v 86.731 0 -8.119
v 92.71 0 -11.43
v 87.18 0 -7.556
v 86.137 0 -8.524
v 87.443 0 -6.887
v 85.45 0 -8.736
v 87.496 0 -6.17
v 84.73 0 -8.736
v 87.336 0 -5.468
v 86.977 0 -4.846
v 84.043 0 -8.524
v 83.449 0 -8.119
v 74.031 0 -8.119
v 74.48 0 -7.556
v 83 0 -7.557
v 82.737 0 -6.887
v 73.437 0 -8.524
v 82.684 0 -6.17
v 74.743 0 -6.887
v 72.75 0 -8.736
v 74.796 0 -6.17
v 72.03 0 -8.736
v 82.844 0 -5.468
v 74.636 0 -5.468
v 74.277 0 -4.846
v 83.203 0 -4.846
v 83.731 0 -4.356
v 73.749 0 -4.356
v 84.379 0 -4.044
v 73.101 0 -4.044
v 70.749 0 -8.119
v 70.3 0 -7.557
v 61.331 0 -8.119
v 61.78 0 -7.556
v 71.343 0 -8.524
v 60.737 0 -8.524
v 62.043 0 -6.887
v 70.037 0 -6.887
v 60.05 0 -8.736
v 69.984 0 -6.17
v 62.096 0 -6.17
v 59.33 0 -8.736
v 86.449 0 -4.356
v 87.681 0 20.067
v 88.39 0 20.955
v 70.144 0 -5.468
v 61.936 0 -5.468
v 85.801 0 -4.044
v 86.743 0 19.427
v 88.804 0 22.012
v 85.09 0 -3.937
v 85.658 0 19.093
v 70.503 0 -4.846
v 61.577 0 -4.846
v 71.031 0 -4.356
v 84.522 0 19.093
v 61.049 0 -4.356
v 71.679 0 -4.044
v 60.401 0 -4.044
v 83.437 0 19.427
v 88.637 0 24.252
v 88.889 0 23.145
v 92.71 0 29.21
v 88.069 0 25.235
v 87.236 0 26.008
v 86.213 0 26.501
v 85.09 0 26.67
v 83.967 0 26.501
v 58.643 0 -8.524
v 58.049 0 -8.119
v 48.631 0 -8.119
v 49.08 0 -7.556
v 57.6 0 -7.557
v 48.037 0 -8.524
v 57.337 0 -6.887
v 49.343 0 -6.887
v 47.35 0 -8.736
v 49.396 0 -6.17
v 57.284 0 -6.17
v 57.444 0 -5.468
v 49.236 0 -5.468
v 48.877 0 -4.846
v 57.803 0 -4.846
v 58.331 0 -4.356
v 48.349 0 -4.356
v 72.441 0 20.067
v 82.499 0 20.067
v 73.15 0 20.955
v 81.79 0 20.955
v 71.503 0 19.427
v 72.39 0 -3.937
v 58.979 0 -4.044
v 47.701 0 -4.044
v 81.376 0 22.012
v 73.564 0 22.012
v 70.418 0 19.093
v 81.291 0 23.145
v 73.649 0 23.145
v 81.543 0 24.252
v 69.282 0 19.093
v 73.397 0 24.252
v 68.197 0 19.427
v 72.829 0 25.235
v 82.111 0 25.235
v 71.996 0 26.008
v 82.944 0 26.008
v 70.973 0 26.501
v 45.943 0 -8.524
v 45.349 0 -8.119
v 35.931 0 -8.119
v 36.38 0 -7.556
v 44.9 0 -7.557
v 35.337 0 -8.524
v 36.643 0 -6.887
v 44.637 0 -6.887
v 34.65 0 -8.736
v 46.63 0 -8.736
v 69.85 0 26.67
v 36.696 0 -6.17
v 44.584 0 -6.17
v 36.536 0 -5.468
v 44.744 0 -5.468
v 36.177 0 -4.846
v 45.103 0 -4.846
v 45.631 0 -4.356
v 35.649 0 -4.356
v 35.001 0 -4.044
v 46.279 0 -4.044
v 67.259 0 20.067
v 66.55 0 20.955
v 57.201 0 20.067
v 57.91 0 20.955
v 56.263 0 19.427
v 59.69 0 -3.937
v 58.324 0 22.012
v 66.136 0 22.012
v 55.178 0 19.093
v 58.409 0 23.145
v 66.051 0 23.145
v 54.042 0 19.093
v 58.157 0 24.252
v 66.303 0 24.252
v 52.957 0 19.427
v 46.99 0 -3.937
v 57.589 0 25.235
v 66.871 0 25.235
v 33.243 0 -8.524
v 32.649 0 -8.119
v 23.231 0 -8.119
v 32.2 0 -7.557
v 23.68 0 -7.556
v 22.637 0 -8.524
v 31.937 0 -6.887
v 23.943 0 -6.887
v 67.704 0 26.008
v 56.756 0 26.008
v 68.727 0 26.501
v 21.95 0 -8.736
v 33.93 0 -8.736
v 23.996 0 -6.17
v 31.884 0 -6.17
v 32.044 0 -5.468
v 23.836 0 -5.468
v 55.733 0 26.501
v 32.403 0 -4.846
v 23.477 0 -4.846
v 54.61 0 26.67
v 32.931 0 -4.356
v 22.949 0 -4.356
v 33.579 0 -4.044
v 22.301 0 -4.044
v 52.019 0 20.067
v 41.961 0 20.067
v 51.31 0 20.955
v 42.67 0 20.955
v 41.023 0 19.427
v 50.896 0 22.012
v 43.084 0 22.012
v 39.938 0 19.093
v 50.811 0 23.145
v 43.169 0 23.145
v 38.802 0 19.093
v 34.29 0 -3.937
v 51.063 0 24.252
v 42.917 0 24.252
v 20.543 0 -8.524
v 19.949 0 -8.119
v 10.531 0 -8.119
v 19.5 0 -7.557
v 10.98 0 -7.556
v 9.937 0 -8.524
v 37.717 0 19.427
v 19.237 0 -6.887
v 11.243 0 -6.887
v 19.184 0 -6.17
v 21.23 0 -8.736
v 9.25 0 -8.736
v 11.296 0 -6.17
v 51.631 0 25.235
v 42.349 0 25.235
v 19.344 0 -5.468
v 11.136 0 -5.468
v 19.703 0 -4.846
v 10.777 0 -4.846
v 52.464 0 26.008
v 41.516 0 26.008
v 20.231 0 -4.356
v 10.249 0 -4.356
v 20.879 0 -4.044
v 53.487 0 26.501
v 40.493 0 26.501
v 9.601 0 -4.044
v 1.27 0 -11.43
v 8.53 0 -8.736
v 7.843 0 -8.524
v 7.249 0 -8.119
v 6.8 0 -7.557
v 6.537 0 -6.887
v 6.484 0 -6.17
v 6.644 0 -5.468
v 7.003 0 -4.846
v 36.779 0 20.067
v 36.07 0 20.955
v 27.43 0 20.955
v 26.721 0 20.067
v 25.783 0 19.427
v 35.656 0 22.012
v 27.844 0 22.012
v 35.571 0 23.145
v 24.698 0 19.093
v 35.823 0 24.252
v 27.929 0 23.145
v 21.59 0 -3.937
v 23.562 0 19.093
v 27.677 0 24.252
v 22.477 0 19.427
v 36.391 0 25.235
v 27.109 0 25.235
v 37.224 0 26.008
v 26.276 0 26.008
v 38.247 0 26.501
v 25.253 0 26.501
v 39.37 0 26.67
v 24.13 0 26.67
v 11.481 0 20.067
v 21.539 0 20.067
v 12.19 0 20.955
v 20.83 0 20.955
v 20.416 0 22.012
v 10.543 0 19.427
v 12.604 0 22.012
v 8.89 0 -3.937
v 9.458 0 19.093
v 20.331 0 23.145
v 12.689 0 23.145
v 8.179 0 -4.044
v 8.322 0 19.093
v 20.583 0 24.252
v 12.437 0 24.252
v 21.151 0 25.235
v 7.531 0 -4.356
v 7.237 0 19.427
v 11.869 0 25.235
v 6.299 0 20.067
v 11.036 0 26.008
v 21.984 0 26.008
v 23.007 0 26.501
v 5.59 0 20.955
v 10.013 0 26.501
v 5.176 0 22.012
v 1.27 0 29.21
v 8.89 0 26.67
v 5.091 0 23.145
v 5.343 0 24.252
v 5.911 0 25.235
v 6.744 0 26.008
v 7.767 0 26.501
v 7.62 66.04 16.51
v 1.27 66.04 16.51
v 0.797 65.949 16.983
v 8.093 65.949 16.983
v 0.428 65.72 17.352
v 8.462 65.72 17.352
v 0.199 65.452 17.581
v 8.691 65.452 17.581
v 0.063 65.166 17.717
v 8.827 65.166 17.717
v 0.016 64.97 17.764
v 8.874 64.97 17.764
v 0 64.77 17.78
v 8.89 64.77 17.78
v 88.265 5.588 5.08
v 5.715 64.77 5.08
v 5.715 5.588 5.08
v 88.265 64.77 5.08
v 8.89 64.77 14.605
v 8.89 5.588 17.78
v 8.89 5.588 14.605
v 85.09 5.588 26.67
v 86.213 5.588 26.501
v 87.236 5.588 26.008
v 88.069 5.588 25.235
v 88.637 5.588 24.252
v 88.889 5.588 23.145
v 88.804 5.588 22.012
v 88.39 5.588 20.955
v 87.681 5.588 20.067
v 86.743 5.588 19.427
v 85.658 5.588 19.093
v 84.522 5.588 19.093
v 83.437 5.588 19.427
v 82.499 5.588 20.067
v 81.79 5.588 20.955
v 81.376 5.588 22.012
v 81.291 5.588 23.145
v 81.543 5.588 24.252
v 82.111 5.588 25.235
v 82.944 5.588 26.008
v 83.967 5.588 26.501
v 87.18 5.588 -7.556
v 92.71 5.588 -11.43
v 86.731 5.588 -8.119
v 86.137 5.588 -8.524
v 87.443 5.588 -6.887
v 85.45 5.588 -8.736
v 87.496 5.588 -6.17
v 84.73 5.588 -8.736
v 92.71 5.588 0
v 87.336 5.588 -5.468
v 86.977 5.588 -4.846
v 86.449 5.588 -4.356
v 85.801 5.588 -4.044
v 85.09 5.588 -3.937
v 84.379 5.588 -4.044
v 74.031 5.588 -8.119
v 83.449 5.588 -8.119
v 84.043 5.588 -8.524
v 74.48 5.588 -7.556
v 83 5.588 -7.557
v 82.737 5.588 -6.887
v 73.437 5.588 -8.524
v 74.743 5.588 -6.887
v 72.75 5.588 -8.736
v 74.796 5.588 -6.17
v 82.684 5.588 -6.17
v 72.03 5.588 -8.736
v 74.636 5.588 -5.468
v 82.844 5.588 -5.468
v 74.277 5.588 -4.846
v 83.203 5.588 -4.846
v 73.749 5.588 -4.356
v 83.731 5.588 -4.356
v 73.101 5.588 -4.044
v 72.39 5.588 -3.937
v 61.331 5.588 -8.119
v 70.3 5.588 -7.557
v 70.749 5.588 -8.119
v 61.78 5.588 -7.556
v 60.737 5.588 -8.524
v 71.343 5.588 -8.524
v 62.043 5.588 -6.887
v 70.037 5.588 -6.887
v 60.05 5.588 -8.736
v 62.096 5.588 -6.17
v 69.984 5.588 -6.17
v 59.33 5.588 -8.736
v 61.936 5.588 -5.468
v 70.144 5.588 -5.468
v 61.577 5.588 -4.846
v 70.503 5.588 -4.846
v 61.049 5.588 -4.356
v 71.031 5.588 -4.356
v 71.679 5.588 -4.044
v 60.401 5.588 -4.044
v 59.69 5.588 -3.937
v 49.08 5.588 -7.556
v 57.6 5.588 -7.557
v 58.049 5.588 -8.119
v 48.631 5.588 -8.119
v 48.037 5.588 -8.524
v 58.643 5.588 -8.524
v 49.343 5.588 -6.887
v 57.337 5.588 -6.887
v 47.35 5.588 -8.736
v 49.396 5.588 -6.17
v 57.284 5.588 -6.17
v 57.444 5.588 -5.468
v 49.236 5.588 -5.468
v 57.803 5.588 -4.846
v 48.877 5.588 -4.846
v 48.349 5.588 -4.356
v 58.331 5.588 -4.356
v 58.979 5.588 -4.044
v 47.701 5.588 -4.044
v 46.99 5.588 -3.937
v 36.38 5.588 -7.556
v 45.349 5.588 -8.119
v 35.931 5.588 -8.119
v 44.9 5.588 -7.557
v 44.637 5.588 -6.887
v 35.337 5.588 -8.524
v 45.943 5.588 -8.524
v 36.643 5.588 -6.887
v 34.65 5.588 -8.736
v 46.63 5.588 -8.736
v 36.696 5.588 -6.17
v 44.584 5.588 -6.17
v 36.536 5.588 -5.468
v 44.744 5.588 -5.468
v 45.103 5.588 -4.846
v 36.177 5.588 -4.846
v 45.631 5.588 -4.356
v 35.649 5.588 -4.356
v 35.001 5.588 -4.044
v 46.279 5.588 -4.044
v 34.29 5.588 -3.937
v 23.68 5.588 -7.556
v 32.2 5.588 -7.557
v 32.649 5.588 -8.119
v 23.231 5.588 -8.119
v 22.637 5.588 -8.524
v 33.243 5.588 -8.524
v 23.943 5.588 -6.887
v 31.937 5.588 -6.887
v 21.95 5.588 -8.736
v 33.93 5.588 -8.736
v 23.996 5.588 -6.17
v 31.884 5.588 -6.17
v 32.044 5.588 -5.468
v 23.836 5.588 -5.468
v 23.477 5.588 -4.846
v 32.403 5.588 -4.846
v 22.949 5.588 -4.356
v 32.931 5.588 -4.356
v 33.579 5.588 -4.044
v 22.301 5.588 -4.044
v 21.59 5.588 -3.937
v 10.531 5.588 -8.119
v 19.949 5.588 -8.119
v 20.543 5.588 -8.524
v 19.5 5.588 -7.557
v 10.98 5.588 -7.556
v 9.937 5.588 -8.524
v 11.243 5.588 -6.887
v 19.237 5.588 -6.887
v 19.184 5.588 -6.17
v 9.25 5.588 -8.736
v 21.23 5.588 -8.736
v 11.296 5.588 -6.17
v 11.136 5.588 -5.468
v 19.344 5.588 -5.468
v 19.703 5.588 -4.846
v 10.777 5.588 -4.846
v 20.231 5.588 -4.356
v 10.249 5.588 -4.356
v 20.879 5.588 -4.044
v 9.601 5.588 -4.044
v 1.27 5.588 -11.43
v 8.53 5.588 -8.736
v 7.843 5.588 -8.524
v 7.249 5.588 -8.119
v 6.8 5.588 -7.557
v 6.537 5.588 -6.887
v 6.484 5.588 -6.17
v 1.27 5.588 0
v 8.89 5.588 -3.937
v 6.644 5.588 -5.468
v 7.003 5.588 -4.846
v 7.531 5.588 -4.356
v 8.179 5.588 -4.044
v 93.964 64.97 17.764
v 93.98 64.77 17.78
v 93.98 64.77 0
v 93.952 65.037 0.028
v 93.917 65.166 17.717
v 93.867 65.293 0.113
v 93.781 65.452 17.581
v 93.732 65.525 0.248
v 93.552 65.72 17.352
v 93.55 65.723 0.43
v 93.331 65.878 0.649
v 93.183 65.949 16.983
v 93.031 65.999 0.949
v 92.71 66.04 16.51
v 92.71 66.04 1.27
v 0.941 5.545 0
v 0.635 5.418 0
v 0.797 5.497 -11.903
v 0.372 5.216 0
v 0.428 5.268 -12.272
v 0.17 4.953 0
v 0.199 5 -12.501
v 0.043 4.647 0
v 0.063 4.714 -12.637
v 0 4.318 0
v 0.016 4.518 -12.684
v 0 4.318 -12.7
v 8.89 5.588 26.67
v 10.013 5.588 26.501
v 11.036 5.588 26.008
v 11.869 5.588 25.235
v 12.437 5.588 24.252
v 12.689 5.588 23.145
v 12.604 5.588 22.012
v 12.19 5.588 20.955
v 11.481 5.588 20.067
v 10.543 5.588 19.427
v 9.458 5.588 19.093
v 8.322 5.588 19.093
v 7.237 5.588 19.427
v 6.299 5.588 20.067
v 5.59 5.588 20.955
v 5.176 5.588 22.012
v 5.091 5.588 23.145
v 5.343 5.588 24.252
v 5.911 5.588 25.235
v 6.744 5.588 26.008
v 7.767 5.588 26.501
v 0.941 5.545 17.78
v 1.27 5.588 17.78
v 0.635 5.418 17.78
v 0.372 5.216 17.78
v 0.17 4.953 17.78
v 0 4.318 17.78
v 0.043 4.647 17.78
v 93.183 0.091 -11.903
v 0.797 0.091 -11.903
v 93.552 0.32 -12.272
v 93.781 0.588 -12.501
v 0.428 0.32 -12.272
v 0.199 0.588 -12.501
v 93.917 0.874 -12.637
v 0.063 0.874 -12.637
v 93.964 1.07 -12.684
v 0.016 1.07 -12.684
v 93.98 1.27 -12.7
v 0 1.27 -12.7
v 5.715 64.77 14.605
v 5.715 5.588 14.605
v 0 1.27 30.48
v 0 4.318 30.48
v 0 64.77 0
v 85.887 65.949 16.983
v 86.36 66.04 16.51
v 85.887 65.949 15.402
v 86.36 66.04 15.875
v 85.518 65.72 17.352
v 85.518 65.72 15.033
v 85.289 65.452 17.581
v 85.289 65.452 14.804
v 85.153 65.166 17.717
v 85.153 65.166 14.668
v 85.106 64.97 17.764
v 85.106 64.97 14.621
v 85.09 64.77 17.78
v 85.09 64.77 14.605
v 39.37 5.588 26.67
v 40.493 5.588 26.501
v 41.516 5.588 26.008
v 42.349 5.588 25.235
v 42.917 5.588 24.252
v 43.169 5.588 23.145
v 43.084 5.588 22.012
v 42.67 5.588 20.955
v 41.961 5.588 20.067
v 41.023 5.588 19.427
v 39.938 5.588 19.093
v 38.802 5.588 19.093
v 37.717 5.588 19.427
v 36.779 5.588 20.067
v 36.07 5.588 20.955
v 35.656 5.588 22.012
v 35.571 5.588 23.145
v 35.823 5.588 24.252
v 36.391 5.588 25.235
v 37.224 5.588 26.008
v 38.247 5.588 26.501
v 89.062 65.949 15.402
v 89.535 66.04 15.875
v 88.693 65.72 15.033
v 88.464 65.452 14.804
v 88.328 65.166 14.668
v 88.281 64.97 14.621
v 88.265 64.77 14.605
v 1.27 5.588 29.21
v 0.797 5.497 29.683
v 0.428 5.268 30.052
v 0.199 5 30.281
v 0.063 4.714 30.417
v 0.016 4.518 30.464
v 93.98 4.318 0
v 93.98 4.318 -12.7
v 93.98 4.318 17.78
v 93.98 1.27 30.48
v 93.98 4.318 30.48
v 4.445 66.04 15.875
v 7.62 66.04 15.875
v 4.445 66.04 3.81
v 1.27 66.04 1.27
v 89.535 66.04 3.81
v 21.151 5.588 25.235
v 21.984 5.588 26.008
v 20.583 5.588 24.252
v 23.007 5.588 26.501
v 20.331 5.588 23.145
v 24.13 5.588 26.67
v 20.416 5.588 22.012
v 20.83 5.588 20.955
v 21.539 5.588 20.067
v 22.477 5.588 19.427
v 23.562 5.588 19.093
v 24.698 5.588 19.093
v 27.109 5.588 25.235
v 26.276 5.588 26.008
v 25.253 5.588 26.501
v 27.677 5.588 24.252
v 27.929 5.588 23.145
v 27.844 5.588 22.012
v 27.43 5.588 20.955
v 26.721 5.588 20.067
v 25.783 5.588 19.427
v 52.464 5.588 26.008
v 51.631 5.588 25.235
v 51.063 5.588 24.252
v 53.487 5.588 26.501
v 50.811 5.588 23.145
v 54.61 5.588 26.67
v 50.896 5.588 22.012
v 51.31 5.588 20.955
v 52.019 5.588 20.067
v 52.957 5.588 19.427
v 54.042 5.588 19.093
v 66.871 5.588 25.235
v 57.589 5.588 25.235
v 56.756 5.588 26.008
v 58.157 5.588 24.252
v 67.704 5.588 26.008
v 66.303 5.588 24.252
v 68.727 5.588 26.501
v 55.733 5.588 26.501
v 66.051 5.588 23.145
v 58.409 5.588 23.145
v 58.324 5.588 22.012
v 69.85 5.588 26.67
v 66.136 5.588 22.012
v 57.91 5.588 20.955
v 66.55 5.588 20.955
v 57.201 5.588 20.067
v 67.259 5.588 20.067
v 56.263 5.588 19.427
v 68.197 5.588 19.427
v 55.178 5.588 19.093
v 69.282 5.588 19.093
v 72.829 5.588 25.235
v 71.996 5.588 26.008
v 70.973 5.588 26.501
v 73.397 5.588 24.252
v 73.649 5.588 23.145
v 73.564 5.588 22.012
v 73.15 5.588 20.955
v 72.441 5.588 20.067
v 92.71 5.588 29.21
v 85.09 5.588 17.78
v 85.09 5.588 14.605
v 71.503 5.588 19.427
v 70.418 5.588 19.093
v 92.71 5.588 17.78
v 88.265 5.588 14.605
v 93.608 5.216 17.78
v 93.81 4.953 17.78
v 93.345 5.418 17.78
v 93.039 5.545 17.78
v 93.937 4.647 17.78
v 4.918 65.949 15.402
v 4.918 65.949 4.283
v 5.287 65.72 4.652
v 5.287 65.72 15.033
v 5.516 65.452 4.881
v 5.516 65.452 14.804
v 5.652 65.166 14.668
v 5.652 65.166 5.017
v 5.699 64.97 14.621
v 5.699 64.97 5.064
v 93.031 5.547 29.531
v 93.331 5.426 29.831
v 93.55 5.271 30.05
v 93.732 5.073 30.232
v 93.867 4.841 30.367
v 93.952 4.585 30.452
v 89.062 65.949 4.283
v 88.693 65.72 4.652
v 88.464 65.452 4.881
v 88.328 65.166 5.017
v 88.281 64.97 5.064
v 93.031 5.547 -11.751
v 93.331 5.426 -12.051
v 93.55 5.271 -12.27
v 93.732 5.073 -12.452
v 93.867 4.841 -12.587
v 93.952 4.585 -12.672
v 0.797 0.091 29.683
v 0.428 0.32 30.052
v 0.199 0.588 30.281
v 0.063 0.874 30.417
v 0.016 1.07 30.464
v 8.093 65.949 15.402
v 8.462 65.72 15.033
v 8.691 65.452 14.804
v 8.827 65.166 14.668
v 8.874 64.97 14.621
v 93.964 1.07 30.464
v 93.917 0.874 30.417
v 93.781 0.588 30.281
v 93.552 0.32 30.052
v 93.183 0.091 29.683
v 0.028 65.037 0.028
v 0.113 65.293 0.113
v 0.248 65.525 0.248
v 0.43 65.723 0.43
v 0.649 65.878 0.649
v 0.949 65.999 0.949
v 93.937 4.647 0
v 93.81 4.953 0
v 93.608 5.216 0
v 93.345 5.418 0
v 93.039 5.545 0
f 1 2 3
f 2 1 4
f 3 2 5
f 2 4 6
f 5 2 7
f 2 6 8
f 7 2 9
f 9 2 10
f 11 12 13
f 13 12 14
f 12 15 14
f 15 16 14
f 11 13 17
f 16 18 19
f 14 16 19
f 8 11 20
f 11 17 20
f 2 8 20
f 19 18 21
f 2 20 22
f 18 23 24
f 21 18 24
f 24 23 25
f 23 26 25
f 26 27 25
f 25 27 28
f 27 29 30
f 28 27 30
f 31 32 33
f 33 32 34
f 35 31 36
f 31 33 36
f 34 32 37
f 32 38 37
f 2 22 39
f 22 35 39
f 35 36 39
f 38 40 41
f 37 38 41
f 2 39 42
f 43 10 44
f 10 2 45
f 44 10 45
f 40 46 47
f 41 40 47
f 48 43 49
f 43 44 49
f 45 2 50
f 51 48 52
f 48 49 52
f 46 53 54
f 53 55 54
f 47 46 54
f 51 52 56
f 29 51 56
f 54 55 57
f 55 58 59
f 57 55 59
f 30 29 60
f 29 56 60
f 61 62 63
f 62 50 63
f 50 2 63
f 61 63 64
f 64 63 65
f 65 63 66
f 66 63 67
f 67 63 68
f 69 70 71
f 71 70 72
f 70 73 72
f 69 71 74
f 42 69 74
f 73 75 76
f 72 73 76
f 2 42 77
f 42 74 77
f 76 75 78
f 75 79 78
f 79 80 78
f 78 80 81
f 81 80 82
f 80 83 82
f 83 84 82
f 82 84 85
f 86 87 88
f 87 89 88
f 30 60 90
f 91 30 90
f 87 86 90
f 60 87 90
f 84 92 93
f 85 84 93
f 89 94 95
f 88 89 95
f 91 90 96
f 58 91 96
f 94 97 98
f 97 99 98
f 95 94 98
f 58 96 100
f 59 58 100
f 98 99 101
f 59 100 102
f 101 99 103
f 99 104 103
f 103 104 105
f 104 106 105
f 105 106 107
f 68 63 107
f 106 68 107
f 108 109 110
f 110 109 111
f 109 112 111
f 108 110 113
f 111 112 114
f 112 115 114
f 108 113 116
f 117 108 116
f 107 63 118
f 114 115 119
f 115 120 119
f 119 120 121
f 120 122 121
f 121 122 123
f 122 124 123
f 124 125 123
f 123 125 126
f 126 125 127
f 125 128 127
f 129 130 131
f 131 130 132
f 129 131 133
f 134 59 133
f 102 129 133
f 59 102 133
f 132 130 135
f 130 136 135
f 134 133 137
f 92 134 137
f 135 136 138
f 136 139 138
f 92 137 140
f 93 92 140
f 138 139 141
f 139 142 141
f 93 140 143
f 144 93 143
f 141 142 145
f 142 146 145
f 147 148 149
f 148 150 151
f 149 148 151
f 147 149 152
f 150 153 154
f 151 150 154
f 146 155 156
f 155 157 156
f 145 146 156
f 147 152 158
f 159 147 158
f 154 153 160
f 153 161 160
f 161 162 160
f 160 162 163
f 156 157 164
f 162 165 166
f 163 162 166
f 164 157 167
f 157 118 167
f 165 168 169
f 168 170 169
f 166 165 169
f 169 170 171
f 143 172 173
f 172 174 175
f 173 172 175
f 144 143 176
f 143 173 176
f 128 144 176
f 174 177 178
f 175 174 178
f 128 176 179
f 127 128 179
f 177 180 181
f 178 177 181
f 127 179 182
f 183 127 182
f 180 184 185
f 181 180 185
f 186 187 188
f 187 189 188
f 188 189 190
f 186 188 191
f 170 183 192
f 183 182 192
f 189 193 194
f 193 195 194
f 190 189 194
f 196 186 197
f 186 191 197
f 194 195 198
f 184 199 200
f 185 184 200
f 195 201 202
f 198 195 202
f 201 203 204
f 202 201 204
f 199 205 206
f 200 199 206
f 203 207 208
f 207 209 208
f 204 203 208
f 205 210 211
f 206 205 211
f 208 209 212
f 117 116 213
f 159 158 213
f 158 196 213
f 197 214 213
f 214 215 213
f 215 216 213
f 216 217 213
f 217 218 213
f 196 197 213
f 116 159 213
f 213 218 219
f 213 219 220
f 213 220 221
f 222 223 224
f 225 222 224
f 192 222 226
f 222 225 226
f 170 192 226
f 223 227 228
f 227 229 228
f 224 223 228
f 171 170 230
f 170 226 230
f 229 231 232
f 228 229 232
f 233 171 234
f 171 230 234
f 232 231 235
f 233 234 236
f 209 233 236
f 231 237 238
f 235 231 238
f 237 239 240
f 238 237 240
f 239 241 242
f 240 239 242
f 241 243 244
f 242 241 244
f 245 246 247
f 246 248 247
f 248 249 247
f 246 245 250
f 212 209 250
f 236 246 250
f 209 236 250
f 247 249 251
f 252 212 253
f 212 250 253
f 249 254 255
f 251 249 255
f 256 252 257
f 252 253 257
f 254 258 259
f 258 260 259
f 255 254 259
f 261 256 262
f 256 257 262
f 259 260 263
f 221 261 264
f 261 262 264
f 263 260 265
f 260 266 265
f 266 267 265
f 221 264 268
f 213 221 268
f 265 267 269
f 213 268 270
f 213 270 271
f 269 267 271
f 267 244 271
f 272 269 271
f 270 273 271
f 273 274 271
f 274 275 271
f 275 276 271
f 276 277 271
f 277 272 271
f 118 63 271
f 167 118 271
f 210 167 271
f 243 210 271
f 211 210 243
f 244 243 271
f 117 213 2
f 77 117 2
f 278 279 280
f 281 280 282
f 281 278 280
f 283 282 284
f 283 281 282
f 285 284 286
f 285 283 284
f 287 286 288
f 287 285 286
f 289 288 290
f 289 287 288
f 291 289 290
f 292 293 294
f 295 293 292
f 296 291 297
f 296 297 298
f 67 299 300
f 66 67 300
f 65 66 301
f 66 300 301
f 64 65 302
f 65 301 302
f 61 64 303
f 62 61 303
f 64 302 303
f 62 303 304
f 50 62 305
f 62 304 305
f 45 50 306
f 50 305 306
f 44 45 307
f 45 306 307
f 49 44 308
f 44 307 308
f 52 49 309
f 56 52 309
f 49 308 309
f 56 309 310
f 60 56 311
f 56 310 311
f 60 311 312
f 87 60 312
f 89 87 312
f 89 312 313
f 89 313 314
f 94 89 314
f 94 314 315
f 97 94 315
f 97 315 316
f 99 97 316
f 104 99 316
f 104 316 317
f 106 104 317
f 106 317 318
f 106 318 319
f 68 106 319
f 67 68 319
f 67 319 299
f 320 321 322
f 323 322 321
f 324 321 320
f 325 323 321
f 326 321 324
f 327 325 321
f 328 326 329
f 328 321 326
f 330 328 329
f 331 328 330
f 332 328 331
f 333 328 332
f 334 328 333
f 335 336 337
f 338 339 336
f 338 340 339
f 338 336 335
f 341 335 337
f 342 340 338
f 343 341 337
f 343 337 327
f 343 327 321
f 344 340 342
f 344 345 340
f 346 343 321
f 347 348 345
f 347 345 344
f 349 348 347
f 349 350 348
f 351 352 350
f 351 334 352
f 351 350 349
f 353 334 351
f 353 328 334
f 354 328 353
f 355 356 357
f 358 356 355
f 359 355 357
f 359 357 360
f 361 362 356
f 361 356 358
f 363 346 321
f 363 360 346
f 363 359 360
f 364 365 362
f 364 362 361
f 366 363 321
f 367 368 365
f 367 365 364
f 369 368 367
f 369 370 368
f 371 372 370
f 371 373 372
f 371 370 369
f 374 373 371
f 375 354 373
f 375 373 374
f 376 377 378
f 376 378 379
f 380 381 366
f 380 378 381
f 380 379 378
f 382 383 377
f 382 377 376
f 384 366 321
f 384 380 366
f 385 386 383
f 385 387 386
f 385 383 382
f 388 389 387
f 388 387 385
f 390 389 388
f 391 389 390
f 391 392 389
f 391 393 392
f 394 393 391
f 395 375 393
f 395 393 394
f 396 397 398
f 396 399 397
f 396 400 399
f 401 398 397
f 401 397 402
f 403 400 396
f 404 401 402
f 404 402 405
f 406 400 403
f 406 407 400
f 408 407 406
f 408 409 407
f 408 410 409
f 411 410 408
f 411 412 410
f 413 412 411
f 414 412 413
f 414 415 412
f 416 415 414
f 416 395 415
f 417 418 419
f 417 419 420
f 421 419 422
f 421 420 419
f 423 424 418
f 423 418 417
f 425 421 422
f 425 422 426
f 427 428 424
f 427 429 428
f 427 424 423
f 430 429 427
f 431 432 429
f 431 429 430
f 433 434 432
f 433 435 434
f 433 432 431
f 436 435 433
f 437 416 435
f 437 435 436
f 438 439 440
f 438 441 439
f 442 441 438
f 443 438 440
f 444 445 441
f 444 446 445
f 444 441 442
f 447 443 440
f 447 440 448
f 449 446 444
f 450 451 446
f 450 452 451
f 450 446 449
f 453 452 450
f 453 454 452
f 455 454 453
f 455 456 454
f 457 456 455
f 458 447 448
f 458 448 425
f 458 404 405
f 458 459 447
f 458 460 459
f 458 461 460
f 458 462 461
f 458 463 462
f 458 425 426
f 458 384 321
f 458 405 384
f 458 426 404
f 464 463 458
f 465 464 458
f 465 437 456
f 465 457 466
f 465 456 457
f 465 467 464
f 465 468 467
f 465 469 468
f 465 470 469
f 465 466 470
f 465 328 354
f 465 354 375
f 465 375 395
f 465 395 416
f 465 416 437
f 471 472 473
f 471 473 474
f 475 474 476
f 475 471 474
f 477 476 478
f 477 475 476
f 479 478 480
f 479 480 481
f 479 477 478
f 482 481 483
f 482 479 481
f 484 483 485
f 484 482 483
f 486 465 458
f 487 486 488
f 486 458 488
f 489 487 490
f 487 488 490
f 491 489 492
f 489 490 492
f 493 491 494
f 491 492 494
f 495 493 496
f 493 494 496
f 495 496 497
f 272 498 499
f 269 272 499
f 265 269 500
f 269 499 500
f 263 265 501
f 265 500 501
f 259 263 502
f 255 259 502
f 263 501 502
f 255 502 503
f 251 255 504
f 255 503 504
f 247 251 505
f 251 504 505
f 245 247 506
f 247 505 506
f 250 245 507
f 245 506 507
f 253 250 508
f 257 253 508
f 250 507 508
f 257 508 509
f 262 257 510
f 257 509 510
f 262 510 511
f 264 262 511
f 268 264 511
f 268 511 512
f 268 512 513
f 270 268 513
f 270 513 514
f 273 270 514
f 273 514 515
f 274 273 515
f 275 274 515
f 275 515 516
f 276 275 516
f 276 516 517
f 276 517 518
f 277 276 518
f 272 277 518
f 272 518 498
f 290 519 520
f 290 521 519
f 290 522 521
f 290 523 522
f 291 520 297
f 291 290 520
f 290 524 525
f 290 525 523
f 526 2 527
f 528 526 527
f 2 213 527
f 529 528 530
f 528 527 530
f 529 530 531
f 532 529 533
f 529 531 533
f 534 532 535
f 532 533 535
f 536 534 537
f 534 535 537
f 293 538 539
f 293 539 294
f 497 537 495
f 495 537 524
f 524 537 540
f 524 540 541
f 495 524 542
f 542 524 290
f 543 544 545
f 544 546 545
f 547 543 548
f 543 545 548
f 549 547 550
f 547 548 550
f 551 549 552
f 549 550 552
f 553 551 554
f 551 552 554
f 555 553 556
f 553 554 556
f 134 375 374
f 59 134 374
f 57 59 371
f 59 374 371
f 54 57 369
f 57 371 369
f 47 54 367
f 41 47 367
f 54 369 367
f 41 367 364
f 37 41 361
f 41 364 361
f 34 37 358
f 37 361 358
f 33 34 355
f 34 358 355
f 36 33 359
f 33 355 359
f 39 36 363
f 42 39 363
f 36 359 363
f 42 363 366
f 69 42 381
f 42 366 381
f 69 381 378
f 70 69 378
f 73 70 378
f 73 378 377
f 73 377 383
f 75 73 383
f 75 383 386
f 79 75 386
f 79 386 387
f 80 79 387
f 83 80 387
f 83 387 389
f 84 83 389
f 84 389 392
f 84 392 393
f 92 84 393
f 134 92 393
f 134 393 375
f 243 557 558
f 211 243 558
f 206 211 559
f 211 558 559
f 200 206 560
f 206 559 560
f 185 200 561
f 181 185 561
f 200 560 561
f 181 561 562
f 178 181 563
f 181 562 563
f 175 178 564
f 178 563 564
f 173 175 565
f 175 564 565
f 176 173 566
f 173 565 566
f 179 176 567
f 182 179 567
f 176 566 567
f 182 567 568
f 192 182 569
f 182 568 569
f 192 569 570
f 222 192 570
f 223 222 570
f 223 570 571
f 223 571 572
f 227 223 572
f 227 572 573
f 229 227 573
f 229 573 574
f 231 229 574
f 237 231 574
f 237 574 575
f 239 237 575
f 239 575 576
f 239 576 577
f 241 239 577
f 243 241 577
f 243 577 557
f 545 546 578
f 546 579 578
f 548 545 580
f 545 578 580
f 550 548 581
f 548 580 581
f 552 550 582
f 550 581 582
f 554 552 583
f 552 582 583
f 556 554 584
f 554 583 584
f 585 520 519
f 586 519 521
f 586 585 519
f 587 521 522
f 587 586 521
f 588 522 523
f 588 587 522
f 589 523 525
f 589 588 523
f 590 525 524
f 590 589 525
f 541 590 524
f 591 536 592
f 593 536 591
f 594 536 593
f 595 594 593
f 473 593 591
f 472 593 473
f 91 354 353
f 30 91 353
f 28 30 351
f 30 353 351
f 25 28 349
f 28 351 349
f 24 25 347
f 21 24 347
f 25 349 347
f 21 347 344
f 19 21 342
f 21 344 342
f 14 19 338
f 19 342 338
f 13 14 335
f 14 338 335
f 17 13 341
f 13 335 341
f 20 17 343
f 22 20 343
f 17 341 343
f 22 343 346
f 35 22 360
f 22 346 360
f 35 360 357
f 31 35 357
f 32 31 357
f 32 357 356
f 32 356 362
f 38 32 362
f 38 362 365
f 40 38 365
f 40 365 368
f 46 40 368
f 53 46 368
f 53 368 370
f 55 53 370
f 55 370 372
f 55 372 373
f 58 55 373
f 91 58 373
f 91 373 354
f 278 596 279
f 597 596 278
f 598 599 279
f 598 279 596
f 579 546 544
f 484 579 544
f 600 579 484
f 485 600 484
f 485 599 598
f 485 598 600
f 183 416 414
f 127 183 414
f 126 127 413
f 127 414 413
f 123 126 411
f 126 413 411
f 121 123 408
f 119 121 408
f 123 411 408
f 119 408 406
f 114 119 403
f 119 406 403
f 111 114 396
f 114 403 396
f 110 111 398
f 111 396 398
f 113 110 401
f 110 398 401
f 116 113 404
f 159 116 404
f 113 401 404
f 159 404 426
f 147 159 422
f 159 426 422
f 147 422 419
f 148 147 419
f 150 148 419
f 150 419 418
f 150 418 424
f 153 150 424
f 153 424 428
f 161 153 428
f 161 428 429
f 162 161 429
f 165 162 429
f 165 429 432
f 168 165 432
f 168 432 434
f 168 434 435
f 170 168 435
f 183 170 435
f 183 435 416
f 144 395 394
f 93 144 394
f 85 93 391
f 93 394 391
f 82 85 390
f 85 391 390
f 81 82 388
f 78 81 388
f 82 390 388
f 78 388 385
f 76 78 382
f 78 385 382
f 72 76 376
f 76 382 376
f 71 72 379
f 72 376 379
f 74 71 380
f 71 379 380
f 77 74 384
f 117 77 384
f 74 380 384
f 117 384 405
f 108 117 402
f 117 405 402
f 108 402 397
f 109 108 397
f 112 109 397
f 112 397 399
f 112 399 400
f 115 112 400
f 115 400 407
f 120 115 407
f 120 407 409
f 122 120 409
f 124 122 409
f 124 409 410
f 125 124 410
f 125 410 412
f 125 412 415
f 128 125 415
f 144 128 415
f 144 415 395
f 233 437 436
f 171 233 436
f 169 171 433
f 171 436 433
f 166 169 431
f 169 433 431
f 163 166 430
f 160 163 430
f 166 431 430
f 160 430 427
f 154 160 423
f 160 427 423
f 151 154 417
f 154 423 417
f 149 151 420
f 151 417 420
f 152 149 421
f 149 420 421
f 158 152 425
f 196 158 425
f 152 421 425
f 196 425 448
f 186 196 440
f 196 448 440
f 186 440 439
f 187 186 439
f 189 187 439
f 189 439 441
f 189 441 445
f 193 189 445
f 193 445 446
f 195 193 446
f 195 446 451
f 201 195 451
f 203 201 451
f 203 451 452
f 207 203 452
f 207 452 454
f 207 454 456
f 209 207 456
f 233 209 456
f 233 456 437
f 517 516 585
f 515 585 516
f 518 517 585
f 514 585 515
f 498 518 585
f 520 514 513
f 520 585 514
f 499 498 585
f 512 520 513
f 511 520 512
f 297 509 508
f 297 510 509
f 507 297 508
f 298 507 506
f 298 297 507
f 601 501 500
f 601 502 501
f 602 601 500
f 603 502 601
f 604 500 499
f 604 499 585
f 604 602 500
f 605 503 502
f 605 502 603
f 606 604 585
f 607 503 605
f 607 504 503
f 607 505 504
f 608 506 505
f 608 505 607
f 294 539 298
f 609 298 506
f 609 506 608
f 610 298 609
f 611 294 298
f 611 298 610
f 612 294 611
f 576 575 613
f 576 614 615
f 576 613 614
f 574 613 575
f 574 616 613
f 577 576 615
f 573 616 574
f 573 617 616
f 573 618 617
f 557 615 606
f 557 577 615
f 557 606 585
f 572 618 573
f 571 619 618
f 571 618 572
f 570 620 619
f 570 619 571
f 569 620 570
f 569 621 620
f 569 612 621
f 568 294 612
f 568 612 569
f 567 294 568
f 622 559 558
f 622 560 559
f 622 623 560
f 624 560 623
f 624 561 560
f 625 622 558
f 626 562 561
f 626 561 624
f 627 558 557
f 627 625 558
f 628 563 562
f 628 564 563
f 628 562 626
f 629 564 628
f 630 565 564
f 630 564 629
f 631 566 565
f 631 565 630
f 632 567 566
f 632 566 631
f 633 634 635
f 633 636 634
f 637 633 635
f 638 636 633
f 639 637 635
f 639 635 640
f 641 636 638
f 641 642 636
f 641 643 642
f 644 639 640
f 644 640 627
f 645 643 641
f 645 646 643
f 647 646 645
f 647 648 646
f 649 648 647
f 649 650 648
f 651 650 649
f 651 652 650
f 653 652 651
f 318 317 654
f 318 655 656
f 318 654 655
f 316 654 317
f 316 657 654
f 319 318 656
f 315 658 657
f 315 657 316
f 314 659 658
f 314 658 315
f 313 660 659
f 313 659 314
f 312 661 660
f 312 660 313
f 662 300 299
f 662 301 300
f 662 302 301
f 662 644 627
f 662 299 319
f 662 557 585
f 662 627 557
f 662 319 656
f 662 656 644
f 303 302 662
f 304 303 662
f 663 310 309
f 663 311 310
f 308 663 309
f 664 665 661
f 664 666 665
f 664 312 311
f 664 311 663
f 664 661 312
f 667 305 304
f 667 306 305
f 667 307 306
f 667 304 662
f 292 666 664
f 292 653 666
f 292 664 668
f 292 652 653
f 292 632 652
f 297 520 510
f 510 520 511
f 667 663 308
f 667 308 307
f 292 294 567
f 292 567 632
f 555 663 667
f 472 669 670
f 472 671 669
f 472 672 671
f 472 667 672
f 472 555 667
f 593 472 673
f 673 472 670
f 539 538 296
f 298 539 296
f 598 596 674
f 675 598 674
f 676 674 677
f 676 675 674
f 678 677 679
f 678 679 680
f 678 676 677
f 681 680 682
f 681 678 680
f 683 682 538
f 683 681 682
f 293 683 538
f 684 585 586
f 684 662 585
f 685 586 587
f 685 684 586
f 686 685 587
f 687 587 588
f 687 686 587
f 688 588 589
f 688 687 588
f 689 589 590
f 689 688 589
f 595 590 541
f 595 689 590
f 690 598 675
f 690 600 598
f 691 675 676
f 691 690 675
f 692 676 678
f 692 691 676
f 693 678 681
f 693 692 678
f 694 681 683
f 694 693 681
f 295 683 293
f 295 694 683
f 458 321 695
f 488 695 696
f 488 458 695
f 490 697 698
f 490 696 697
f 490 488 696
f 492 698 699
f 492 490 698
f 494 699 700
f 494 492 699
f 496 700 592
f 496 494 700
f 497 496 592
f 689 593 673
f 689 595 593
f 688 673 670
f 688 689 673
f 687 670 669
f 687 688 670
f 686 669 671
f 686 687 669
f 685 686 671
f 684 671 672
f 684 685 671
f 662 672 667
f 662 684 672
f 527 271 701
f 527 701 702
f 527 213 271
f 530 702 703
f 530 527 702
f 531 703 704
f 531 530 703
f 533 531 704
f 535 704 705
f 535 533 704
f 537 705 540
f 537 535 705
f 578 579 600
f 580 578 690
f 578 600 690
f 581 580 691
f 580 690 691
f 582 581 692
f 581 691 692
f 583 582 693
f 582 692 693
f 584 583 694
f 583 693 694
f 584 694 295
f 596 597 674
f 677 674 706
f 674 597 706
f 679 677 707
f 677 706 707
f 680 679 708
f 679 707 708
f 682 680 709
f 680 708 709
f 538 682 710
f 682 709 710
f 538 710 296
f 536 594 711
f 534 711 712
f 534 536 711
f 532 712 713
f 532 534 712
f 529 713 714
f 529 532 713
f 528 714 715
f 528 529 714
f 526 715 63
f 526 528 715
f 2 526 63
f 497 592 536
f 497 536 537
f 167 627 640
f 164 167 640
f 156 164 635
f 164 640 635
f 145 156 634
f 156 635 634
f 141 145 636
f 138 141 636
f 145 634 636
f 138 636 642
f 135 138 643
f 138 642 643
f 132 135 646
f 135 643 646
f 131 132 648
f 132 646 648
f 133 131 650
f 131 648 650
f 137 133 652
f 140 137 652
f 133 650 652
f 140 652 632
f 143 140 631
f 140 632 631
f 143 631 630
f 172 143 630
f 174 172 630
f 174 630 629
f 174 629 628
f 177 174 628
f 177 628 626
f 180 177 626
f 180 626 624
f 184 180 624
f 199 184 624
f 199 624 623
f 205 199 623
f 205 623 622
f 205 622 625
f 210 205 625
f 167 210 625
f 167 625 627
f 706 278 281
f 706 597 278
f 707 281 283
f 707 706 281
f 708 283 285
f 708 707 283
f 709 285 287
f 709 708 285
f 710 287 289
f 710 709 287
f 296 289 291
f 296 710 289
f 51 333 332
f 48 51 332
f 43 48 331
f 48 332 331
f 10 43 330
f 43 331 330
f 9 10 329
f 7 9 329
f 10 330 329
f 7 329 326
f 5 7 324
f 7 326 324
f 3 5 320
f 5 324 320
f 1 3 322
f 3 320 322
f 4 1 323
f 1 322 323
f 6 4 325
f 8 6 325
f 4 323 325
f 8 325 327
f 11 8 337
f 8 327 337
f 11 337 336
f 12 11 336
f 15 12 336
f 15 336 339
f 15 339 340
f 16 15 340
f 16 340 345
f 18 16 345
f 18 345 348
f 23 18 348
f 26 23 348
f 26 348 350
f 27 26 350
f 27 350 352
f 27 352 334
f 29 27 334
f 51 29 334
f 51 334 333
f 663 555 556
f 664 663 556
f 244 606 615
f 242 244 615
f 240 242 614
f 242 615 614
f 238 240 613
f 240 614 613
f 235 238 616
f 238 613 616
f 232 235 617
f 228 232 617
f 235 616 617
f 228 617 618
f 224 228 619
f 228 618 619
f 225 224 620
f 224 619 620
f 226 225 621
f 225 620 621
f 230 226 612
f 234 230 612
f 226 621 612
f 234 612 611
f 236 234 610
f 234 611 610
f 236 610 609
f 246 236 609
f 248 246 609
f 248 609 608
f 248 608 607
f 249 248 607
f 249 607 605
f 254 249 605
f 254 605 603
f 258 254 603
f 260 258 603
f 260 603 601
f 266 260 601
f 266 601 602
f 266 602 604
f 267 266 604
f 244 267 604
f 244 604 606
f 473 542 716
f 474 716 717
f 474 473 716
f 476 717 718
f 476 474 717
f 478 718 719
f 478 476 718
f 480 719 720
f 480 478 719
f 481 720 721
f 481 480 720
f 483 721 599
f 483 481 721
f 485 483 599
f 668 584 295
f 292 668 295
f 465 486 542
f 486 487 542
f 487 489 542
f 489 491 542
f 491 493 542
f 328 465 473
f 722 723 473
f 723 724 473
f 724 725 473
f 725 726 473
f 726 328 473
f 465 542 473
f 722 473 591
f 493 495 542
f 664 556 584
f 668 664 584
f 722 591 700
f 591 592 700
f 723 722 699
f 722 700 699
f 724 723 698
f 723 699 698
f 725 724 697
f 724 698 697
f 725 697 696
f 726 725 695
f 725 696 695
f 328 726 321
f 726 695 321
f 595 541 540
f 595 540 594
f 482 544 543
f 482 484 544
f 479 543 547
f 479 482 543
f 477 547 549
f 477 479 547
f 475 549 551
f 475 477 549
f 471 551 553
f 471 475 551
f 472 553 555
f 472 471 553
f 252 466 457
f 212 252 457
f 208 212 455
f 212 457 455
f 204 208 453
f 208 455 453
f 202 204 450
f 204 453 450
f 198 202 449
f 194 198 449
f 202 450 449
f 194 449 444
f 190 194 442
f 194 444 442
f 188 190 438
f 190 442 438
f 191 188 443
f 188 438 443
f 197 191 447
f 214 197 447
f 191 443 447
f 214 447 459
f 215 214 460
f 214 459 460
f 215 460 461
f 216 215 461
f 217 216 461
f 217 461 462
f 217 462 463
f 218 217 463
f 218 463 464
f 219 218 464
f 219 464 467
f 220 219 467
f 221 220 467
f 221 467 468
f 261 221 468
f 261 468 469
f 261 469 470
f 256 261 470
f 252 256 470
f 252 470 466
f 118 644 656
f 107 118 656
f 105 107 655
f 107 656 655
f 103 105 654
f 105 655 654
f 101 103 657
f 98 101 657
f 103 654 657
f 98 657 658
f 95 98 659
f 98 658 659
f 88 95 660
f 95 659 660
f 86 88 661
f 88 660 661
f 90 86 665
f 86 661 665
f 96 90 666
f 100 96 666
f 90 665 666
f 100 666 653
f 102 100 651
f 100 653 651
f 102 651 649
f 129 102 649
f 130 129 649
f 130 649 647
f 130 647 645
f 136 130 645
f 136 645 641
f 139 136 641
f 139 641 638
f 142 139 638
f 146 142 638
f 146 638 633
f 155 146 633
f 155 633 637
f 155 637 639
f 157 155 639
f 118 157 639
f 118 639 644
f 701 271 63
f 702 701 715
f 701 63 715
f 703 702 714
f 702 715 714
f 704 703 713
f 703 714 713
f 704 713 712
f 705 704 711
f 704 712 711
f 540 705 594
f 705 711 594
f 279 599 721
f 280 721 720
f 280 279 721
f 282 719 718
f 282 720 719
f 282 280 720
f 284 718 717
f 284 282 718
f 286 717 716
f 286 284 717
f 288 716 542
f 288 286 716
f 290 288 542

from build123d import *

# Parameters (mm, degrees)
SKETCH2_W           = 93.98
SKETCH2_H           = 66.04
BOSS_EXTRUDE1_DEPTH = 17.78
SKETCH3_W           = 93.98
SKETCH3_H           = 5.588
BOSS_EXTRUDE2_DEPTH = 12.7
SKETCH4_W           = 82.55
SKETCH4_H           = 9.525
SKETCH4_W_2         = 76.2
SKETCH4_H_2         = 3.175
CUT_EXTRUDE1_DEPTH  = 60.452
SKETCH5_W           = 93.98
SKETCH5_H           = 5.588
BOSS_EXTRUDE3_DEPTH = 12.7
SKETCH6_R           = 2.413
SKETCH6_R_2         = 3.81
CUT_EXTRUDE2_DEPTH  = 116.826228049
FILLET1_R           = 1.27
FILLET2_R           = 1.27
FILLET3_R           = 1.27


with BuildPart() as part:
    # Sketch2 → Boss-Extrude1 (new body)
    with BuildSketch(Plane.XY):
        with Locations((46.99, 33.02)):
            Rectangle(SKETCH2_W, SKETCH2_H)
    extrude(amount=BOSS_EXTRUDE1_DEPTH)

    # Sketch3 → Boss-Extrude2 (add)
    with BuildSketch(Plane.XY.offset(17.78)):
        with Locations((46.99, 2.794)):
            Rectangle(SKETCH3_W, SKETCH3_H)
    extrude(amount=BOSS_EXTRUDE2_DEPTH)

    # Sketch4 → Cut-Extrude1 (cut)
    with BuildSketch(Plane(origin=(0, 66.04, 0), x_dir=(1, 0, 0), z_dir=(0, 1, 0))):
        with Locations((46.99, -9.8425)):
            Rectangle(SKETCH4_W, SKETCH4_H)
        with Locations((46.99, -16.1925)):
            Rectangle(SKETCH4_W_2, SKETCH4_H_2)
    extrude(amount=-CUT_EXTRUDE1_DEPTH, mode=Mode.SUBTRACT)

    # Sketch5 → Boss-Extrude3 (add)
    with BuildSketch(Plane(origin=(0, 0, 0), x_dir=(-1, 0, 0), z_dir=(0, 0, -1))):
        with Locations((-46.99, 2.794)):
            Rectangle(SKETCH5_W, SKETCH5_H)
    extrude(amount=BOSS_EXTRUDE3_DEPTH)

    # Sketch6 → Cut-Extrude2 (cut, through all)
    with BuildSketch(Plane(origin=(0, 5.588, 0), x_dir=(1, 0, 0), z_dir=(0, 1, 0))):
        with Locations(Location((8.89, 6.35, 0), (0, 0, 270))):
            Circle(SKETCH6_R)
        with Locations(Location((21.59, 6.35, 0), (0, 0, 270))):
            Circle(SKETCH6_R)
        with Locations(Location((34.29, 6.35, 0), (0, 0, 270))):
            Circle(SKETCH6_R)
        with Locations(Location((46.99, 6.35, 0), (0, 0, 270))):
            Circle(SKETCH6_R)
        with Locations(Location((59.69, 6.35, 0), (0, 0, 270))):
            Circle(SKETCH6_R)
        with Locations(Location((72.39, 6.35, 0), (0, 0, 270))):
            Circle(SKETCH6_R)
        with Locations(Location((85.09, 6.35, 0), (0, 0, 270))):
            Circle(SKETCH6_R)
        with Locations(Location((8.89, -22.86, 0), (0, 0, 270))):
            Circle(SKETCH6_R_2)
        with Locations(Location((24.13, -22.86, 0), (0, 0, 270))):
            Circle(SKETCH6_R_2)
        with Locations(Location((39.37, -22.86, 0), (0, 0, 270))):
            Circle(SKETCH6_R_2)
        with Locations(Location((54.61, -22.86, 0), (0, 0, 270))):
            Circle(SKETCH6_R_2)
        with Locations(Location((69.85, -22.86, 0), (0, 0, 270))):
            Circle(SKETCH6_R_2)
        with Locations(Location((85.09, -22.86, 0), (0, 0, 270))):
            Circle(SKETCH6_R_2)
    extrude(amount=-CUT_EXTRUDE2_DEPTH, mode=Mode.SUBTRACT)

    # Fillet1
    fillet1_edges = [part.edges().sort_by_distance(p)[0] for p in [
        (89.535, 66.04, 17.78),
        (4.445, 66.04, 17.78),
        (88.265, 66.04, 9.8425),
        (46.99, 66.04, 5.08),
        (5.715, 66.04, 9.8425),
        (7.3025, 66.04, 14.605),
        (8.89, 66.04, 16.1925),
        (86.6775, 66.04, 14.605),
        (85.09, 66.04, 16.1925),
        (46.99, 66.04, 0),
        (0, 66.04, 8.89),
        (93.98, 66.04, 8.89),
    ]]
    fillet(fillet1_edges, radius=FILLET1_R)

    # Fillet2
    fillet2_edges = [part.edges().sort_by_distance(p)[0] for p in [
        (0, 5.588, 24.13),
        (93.98, 5.588, 24.13),
        (46.99, 5.588, 30.48),
        (93.98, 5.588, -6.35),
        (0, 5.588, -6.35),
        (46.99, 5.588, -12.7),
    ]]
    fillet(fillet2_edges, radius=FILLET2_R)

    # Fillet3
    fillet3_edges = [part.edges().sort_by_distance(p)[0] for p in [
        (46.99, 0, 30.48),
        (46.99, 0, -12.7),
        (93.98, 0, 8.89),
        (0, 0, 8.89),
    ]]
    fillet(fillet3_edges, radius=FILLET3_R)


solid = part.part
